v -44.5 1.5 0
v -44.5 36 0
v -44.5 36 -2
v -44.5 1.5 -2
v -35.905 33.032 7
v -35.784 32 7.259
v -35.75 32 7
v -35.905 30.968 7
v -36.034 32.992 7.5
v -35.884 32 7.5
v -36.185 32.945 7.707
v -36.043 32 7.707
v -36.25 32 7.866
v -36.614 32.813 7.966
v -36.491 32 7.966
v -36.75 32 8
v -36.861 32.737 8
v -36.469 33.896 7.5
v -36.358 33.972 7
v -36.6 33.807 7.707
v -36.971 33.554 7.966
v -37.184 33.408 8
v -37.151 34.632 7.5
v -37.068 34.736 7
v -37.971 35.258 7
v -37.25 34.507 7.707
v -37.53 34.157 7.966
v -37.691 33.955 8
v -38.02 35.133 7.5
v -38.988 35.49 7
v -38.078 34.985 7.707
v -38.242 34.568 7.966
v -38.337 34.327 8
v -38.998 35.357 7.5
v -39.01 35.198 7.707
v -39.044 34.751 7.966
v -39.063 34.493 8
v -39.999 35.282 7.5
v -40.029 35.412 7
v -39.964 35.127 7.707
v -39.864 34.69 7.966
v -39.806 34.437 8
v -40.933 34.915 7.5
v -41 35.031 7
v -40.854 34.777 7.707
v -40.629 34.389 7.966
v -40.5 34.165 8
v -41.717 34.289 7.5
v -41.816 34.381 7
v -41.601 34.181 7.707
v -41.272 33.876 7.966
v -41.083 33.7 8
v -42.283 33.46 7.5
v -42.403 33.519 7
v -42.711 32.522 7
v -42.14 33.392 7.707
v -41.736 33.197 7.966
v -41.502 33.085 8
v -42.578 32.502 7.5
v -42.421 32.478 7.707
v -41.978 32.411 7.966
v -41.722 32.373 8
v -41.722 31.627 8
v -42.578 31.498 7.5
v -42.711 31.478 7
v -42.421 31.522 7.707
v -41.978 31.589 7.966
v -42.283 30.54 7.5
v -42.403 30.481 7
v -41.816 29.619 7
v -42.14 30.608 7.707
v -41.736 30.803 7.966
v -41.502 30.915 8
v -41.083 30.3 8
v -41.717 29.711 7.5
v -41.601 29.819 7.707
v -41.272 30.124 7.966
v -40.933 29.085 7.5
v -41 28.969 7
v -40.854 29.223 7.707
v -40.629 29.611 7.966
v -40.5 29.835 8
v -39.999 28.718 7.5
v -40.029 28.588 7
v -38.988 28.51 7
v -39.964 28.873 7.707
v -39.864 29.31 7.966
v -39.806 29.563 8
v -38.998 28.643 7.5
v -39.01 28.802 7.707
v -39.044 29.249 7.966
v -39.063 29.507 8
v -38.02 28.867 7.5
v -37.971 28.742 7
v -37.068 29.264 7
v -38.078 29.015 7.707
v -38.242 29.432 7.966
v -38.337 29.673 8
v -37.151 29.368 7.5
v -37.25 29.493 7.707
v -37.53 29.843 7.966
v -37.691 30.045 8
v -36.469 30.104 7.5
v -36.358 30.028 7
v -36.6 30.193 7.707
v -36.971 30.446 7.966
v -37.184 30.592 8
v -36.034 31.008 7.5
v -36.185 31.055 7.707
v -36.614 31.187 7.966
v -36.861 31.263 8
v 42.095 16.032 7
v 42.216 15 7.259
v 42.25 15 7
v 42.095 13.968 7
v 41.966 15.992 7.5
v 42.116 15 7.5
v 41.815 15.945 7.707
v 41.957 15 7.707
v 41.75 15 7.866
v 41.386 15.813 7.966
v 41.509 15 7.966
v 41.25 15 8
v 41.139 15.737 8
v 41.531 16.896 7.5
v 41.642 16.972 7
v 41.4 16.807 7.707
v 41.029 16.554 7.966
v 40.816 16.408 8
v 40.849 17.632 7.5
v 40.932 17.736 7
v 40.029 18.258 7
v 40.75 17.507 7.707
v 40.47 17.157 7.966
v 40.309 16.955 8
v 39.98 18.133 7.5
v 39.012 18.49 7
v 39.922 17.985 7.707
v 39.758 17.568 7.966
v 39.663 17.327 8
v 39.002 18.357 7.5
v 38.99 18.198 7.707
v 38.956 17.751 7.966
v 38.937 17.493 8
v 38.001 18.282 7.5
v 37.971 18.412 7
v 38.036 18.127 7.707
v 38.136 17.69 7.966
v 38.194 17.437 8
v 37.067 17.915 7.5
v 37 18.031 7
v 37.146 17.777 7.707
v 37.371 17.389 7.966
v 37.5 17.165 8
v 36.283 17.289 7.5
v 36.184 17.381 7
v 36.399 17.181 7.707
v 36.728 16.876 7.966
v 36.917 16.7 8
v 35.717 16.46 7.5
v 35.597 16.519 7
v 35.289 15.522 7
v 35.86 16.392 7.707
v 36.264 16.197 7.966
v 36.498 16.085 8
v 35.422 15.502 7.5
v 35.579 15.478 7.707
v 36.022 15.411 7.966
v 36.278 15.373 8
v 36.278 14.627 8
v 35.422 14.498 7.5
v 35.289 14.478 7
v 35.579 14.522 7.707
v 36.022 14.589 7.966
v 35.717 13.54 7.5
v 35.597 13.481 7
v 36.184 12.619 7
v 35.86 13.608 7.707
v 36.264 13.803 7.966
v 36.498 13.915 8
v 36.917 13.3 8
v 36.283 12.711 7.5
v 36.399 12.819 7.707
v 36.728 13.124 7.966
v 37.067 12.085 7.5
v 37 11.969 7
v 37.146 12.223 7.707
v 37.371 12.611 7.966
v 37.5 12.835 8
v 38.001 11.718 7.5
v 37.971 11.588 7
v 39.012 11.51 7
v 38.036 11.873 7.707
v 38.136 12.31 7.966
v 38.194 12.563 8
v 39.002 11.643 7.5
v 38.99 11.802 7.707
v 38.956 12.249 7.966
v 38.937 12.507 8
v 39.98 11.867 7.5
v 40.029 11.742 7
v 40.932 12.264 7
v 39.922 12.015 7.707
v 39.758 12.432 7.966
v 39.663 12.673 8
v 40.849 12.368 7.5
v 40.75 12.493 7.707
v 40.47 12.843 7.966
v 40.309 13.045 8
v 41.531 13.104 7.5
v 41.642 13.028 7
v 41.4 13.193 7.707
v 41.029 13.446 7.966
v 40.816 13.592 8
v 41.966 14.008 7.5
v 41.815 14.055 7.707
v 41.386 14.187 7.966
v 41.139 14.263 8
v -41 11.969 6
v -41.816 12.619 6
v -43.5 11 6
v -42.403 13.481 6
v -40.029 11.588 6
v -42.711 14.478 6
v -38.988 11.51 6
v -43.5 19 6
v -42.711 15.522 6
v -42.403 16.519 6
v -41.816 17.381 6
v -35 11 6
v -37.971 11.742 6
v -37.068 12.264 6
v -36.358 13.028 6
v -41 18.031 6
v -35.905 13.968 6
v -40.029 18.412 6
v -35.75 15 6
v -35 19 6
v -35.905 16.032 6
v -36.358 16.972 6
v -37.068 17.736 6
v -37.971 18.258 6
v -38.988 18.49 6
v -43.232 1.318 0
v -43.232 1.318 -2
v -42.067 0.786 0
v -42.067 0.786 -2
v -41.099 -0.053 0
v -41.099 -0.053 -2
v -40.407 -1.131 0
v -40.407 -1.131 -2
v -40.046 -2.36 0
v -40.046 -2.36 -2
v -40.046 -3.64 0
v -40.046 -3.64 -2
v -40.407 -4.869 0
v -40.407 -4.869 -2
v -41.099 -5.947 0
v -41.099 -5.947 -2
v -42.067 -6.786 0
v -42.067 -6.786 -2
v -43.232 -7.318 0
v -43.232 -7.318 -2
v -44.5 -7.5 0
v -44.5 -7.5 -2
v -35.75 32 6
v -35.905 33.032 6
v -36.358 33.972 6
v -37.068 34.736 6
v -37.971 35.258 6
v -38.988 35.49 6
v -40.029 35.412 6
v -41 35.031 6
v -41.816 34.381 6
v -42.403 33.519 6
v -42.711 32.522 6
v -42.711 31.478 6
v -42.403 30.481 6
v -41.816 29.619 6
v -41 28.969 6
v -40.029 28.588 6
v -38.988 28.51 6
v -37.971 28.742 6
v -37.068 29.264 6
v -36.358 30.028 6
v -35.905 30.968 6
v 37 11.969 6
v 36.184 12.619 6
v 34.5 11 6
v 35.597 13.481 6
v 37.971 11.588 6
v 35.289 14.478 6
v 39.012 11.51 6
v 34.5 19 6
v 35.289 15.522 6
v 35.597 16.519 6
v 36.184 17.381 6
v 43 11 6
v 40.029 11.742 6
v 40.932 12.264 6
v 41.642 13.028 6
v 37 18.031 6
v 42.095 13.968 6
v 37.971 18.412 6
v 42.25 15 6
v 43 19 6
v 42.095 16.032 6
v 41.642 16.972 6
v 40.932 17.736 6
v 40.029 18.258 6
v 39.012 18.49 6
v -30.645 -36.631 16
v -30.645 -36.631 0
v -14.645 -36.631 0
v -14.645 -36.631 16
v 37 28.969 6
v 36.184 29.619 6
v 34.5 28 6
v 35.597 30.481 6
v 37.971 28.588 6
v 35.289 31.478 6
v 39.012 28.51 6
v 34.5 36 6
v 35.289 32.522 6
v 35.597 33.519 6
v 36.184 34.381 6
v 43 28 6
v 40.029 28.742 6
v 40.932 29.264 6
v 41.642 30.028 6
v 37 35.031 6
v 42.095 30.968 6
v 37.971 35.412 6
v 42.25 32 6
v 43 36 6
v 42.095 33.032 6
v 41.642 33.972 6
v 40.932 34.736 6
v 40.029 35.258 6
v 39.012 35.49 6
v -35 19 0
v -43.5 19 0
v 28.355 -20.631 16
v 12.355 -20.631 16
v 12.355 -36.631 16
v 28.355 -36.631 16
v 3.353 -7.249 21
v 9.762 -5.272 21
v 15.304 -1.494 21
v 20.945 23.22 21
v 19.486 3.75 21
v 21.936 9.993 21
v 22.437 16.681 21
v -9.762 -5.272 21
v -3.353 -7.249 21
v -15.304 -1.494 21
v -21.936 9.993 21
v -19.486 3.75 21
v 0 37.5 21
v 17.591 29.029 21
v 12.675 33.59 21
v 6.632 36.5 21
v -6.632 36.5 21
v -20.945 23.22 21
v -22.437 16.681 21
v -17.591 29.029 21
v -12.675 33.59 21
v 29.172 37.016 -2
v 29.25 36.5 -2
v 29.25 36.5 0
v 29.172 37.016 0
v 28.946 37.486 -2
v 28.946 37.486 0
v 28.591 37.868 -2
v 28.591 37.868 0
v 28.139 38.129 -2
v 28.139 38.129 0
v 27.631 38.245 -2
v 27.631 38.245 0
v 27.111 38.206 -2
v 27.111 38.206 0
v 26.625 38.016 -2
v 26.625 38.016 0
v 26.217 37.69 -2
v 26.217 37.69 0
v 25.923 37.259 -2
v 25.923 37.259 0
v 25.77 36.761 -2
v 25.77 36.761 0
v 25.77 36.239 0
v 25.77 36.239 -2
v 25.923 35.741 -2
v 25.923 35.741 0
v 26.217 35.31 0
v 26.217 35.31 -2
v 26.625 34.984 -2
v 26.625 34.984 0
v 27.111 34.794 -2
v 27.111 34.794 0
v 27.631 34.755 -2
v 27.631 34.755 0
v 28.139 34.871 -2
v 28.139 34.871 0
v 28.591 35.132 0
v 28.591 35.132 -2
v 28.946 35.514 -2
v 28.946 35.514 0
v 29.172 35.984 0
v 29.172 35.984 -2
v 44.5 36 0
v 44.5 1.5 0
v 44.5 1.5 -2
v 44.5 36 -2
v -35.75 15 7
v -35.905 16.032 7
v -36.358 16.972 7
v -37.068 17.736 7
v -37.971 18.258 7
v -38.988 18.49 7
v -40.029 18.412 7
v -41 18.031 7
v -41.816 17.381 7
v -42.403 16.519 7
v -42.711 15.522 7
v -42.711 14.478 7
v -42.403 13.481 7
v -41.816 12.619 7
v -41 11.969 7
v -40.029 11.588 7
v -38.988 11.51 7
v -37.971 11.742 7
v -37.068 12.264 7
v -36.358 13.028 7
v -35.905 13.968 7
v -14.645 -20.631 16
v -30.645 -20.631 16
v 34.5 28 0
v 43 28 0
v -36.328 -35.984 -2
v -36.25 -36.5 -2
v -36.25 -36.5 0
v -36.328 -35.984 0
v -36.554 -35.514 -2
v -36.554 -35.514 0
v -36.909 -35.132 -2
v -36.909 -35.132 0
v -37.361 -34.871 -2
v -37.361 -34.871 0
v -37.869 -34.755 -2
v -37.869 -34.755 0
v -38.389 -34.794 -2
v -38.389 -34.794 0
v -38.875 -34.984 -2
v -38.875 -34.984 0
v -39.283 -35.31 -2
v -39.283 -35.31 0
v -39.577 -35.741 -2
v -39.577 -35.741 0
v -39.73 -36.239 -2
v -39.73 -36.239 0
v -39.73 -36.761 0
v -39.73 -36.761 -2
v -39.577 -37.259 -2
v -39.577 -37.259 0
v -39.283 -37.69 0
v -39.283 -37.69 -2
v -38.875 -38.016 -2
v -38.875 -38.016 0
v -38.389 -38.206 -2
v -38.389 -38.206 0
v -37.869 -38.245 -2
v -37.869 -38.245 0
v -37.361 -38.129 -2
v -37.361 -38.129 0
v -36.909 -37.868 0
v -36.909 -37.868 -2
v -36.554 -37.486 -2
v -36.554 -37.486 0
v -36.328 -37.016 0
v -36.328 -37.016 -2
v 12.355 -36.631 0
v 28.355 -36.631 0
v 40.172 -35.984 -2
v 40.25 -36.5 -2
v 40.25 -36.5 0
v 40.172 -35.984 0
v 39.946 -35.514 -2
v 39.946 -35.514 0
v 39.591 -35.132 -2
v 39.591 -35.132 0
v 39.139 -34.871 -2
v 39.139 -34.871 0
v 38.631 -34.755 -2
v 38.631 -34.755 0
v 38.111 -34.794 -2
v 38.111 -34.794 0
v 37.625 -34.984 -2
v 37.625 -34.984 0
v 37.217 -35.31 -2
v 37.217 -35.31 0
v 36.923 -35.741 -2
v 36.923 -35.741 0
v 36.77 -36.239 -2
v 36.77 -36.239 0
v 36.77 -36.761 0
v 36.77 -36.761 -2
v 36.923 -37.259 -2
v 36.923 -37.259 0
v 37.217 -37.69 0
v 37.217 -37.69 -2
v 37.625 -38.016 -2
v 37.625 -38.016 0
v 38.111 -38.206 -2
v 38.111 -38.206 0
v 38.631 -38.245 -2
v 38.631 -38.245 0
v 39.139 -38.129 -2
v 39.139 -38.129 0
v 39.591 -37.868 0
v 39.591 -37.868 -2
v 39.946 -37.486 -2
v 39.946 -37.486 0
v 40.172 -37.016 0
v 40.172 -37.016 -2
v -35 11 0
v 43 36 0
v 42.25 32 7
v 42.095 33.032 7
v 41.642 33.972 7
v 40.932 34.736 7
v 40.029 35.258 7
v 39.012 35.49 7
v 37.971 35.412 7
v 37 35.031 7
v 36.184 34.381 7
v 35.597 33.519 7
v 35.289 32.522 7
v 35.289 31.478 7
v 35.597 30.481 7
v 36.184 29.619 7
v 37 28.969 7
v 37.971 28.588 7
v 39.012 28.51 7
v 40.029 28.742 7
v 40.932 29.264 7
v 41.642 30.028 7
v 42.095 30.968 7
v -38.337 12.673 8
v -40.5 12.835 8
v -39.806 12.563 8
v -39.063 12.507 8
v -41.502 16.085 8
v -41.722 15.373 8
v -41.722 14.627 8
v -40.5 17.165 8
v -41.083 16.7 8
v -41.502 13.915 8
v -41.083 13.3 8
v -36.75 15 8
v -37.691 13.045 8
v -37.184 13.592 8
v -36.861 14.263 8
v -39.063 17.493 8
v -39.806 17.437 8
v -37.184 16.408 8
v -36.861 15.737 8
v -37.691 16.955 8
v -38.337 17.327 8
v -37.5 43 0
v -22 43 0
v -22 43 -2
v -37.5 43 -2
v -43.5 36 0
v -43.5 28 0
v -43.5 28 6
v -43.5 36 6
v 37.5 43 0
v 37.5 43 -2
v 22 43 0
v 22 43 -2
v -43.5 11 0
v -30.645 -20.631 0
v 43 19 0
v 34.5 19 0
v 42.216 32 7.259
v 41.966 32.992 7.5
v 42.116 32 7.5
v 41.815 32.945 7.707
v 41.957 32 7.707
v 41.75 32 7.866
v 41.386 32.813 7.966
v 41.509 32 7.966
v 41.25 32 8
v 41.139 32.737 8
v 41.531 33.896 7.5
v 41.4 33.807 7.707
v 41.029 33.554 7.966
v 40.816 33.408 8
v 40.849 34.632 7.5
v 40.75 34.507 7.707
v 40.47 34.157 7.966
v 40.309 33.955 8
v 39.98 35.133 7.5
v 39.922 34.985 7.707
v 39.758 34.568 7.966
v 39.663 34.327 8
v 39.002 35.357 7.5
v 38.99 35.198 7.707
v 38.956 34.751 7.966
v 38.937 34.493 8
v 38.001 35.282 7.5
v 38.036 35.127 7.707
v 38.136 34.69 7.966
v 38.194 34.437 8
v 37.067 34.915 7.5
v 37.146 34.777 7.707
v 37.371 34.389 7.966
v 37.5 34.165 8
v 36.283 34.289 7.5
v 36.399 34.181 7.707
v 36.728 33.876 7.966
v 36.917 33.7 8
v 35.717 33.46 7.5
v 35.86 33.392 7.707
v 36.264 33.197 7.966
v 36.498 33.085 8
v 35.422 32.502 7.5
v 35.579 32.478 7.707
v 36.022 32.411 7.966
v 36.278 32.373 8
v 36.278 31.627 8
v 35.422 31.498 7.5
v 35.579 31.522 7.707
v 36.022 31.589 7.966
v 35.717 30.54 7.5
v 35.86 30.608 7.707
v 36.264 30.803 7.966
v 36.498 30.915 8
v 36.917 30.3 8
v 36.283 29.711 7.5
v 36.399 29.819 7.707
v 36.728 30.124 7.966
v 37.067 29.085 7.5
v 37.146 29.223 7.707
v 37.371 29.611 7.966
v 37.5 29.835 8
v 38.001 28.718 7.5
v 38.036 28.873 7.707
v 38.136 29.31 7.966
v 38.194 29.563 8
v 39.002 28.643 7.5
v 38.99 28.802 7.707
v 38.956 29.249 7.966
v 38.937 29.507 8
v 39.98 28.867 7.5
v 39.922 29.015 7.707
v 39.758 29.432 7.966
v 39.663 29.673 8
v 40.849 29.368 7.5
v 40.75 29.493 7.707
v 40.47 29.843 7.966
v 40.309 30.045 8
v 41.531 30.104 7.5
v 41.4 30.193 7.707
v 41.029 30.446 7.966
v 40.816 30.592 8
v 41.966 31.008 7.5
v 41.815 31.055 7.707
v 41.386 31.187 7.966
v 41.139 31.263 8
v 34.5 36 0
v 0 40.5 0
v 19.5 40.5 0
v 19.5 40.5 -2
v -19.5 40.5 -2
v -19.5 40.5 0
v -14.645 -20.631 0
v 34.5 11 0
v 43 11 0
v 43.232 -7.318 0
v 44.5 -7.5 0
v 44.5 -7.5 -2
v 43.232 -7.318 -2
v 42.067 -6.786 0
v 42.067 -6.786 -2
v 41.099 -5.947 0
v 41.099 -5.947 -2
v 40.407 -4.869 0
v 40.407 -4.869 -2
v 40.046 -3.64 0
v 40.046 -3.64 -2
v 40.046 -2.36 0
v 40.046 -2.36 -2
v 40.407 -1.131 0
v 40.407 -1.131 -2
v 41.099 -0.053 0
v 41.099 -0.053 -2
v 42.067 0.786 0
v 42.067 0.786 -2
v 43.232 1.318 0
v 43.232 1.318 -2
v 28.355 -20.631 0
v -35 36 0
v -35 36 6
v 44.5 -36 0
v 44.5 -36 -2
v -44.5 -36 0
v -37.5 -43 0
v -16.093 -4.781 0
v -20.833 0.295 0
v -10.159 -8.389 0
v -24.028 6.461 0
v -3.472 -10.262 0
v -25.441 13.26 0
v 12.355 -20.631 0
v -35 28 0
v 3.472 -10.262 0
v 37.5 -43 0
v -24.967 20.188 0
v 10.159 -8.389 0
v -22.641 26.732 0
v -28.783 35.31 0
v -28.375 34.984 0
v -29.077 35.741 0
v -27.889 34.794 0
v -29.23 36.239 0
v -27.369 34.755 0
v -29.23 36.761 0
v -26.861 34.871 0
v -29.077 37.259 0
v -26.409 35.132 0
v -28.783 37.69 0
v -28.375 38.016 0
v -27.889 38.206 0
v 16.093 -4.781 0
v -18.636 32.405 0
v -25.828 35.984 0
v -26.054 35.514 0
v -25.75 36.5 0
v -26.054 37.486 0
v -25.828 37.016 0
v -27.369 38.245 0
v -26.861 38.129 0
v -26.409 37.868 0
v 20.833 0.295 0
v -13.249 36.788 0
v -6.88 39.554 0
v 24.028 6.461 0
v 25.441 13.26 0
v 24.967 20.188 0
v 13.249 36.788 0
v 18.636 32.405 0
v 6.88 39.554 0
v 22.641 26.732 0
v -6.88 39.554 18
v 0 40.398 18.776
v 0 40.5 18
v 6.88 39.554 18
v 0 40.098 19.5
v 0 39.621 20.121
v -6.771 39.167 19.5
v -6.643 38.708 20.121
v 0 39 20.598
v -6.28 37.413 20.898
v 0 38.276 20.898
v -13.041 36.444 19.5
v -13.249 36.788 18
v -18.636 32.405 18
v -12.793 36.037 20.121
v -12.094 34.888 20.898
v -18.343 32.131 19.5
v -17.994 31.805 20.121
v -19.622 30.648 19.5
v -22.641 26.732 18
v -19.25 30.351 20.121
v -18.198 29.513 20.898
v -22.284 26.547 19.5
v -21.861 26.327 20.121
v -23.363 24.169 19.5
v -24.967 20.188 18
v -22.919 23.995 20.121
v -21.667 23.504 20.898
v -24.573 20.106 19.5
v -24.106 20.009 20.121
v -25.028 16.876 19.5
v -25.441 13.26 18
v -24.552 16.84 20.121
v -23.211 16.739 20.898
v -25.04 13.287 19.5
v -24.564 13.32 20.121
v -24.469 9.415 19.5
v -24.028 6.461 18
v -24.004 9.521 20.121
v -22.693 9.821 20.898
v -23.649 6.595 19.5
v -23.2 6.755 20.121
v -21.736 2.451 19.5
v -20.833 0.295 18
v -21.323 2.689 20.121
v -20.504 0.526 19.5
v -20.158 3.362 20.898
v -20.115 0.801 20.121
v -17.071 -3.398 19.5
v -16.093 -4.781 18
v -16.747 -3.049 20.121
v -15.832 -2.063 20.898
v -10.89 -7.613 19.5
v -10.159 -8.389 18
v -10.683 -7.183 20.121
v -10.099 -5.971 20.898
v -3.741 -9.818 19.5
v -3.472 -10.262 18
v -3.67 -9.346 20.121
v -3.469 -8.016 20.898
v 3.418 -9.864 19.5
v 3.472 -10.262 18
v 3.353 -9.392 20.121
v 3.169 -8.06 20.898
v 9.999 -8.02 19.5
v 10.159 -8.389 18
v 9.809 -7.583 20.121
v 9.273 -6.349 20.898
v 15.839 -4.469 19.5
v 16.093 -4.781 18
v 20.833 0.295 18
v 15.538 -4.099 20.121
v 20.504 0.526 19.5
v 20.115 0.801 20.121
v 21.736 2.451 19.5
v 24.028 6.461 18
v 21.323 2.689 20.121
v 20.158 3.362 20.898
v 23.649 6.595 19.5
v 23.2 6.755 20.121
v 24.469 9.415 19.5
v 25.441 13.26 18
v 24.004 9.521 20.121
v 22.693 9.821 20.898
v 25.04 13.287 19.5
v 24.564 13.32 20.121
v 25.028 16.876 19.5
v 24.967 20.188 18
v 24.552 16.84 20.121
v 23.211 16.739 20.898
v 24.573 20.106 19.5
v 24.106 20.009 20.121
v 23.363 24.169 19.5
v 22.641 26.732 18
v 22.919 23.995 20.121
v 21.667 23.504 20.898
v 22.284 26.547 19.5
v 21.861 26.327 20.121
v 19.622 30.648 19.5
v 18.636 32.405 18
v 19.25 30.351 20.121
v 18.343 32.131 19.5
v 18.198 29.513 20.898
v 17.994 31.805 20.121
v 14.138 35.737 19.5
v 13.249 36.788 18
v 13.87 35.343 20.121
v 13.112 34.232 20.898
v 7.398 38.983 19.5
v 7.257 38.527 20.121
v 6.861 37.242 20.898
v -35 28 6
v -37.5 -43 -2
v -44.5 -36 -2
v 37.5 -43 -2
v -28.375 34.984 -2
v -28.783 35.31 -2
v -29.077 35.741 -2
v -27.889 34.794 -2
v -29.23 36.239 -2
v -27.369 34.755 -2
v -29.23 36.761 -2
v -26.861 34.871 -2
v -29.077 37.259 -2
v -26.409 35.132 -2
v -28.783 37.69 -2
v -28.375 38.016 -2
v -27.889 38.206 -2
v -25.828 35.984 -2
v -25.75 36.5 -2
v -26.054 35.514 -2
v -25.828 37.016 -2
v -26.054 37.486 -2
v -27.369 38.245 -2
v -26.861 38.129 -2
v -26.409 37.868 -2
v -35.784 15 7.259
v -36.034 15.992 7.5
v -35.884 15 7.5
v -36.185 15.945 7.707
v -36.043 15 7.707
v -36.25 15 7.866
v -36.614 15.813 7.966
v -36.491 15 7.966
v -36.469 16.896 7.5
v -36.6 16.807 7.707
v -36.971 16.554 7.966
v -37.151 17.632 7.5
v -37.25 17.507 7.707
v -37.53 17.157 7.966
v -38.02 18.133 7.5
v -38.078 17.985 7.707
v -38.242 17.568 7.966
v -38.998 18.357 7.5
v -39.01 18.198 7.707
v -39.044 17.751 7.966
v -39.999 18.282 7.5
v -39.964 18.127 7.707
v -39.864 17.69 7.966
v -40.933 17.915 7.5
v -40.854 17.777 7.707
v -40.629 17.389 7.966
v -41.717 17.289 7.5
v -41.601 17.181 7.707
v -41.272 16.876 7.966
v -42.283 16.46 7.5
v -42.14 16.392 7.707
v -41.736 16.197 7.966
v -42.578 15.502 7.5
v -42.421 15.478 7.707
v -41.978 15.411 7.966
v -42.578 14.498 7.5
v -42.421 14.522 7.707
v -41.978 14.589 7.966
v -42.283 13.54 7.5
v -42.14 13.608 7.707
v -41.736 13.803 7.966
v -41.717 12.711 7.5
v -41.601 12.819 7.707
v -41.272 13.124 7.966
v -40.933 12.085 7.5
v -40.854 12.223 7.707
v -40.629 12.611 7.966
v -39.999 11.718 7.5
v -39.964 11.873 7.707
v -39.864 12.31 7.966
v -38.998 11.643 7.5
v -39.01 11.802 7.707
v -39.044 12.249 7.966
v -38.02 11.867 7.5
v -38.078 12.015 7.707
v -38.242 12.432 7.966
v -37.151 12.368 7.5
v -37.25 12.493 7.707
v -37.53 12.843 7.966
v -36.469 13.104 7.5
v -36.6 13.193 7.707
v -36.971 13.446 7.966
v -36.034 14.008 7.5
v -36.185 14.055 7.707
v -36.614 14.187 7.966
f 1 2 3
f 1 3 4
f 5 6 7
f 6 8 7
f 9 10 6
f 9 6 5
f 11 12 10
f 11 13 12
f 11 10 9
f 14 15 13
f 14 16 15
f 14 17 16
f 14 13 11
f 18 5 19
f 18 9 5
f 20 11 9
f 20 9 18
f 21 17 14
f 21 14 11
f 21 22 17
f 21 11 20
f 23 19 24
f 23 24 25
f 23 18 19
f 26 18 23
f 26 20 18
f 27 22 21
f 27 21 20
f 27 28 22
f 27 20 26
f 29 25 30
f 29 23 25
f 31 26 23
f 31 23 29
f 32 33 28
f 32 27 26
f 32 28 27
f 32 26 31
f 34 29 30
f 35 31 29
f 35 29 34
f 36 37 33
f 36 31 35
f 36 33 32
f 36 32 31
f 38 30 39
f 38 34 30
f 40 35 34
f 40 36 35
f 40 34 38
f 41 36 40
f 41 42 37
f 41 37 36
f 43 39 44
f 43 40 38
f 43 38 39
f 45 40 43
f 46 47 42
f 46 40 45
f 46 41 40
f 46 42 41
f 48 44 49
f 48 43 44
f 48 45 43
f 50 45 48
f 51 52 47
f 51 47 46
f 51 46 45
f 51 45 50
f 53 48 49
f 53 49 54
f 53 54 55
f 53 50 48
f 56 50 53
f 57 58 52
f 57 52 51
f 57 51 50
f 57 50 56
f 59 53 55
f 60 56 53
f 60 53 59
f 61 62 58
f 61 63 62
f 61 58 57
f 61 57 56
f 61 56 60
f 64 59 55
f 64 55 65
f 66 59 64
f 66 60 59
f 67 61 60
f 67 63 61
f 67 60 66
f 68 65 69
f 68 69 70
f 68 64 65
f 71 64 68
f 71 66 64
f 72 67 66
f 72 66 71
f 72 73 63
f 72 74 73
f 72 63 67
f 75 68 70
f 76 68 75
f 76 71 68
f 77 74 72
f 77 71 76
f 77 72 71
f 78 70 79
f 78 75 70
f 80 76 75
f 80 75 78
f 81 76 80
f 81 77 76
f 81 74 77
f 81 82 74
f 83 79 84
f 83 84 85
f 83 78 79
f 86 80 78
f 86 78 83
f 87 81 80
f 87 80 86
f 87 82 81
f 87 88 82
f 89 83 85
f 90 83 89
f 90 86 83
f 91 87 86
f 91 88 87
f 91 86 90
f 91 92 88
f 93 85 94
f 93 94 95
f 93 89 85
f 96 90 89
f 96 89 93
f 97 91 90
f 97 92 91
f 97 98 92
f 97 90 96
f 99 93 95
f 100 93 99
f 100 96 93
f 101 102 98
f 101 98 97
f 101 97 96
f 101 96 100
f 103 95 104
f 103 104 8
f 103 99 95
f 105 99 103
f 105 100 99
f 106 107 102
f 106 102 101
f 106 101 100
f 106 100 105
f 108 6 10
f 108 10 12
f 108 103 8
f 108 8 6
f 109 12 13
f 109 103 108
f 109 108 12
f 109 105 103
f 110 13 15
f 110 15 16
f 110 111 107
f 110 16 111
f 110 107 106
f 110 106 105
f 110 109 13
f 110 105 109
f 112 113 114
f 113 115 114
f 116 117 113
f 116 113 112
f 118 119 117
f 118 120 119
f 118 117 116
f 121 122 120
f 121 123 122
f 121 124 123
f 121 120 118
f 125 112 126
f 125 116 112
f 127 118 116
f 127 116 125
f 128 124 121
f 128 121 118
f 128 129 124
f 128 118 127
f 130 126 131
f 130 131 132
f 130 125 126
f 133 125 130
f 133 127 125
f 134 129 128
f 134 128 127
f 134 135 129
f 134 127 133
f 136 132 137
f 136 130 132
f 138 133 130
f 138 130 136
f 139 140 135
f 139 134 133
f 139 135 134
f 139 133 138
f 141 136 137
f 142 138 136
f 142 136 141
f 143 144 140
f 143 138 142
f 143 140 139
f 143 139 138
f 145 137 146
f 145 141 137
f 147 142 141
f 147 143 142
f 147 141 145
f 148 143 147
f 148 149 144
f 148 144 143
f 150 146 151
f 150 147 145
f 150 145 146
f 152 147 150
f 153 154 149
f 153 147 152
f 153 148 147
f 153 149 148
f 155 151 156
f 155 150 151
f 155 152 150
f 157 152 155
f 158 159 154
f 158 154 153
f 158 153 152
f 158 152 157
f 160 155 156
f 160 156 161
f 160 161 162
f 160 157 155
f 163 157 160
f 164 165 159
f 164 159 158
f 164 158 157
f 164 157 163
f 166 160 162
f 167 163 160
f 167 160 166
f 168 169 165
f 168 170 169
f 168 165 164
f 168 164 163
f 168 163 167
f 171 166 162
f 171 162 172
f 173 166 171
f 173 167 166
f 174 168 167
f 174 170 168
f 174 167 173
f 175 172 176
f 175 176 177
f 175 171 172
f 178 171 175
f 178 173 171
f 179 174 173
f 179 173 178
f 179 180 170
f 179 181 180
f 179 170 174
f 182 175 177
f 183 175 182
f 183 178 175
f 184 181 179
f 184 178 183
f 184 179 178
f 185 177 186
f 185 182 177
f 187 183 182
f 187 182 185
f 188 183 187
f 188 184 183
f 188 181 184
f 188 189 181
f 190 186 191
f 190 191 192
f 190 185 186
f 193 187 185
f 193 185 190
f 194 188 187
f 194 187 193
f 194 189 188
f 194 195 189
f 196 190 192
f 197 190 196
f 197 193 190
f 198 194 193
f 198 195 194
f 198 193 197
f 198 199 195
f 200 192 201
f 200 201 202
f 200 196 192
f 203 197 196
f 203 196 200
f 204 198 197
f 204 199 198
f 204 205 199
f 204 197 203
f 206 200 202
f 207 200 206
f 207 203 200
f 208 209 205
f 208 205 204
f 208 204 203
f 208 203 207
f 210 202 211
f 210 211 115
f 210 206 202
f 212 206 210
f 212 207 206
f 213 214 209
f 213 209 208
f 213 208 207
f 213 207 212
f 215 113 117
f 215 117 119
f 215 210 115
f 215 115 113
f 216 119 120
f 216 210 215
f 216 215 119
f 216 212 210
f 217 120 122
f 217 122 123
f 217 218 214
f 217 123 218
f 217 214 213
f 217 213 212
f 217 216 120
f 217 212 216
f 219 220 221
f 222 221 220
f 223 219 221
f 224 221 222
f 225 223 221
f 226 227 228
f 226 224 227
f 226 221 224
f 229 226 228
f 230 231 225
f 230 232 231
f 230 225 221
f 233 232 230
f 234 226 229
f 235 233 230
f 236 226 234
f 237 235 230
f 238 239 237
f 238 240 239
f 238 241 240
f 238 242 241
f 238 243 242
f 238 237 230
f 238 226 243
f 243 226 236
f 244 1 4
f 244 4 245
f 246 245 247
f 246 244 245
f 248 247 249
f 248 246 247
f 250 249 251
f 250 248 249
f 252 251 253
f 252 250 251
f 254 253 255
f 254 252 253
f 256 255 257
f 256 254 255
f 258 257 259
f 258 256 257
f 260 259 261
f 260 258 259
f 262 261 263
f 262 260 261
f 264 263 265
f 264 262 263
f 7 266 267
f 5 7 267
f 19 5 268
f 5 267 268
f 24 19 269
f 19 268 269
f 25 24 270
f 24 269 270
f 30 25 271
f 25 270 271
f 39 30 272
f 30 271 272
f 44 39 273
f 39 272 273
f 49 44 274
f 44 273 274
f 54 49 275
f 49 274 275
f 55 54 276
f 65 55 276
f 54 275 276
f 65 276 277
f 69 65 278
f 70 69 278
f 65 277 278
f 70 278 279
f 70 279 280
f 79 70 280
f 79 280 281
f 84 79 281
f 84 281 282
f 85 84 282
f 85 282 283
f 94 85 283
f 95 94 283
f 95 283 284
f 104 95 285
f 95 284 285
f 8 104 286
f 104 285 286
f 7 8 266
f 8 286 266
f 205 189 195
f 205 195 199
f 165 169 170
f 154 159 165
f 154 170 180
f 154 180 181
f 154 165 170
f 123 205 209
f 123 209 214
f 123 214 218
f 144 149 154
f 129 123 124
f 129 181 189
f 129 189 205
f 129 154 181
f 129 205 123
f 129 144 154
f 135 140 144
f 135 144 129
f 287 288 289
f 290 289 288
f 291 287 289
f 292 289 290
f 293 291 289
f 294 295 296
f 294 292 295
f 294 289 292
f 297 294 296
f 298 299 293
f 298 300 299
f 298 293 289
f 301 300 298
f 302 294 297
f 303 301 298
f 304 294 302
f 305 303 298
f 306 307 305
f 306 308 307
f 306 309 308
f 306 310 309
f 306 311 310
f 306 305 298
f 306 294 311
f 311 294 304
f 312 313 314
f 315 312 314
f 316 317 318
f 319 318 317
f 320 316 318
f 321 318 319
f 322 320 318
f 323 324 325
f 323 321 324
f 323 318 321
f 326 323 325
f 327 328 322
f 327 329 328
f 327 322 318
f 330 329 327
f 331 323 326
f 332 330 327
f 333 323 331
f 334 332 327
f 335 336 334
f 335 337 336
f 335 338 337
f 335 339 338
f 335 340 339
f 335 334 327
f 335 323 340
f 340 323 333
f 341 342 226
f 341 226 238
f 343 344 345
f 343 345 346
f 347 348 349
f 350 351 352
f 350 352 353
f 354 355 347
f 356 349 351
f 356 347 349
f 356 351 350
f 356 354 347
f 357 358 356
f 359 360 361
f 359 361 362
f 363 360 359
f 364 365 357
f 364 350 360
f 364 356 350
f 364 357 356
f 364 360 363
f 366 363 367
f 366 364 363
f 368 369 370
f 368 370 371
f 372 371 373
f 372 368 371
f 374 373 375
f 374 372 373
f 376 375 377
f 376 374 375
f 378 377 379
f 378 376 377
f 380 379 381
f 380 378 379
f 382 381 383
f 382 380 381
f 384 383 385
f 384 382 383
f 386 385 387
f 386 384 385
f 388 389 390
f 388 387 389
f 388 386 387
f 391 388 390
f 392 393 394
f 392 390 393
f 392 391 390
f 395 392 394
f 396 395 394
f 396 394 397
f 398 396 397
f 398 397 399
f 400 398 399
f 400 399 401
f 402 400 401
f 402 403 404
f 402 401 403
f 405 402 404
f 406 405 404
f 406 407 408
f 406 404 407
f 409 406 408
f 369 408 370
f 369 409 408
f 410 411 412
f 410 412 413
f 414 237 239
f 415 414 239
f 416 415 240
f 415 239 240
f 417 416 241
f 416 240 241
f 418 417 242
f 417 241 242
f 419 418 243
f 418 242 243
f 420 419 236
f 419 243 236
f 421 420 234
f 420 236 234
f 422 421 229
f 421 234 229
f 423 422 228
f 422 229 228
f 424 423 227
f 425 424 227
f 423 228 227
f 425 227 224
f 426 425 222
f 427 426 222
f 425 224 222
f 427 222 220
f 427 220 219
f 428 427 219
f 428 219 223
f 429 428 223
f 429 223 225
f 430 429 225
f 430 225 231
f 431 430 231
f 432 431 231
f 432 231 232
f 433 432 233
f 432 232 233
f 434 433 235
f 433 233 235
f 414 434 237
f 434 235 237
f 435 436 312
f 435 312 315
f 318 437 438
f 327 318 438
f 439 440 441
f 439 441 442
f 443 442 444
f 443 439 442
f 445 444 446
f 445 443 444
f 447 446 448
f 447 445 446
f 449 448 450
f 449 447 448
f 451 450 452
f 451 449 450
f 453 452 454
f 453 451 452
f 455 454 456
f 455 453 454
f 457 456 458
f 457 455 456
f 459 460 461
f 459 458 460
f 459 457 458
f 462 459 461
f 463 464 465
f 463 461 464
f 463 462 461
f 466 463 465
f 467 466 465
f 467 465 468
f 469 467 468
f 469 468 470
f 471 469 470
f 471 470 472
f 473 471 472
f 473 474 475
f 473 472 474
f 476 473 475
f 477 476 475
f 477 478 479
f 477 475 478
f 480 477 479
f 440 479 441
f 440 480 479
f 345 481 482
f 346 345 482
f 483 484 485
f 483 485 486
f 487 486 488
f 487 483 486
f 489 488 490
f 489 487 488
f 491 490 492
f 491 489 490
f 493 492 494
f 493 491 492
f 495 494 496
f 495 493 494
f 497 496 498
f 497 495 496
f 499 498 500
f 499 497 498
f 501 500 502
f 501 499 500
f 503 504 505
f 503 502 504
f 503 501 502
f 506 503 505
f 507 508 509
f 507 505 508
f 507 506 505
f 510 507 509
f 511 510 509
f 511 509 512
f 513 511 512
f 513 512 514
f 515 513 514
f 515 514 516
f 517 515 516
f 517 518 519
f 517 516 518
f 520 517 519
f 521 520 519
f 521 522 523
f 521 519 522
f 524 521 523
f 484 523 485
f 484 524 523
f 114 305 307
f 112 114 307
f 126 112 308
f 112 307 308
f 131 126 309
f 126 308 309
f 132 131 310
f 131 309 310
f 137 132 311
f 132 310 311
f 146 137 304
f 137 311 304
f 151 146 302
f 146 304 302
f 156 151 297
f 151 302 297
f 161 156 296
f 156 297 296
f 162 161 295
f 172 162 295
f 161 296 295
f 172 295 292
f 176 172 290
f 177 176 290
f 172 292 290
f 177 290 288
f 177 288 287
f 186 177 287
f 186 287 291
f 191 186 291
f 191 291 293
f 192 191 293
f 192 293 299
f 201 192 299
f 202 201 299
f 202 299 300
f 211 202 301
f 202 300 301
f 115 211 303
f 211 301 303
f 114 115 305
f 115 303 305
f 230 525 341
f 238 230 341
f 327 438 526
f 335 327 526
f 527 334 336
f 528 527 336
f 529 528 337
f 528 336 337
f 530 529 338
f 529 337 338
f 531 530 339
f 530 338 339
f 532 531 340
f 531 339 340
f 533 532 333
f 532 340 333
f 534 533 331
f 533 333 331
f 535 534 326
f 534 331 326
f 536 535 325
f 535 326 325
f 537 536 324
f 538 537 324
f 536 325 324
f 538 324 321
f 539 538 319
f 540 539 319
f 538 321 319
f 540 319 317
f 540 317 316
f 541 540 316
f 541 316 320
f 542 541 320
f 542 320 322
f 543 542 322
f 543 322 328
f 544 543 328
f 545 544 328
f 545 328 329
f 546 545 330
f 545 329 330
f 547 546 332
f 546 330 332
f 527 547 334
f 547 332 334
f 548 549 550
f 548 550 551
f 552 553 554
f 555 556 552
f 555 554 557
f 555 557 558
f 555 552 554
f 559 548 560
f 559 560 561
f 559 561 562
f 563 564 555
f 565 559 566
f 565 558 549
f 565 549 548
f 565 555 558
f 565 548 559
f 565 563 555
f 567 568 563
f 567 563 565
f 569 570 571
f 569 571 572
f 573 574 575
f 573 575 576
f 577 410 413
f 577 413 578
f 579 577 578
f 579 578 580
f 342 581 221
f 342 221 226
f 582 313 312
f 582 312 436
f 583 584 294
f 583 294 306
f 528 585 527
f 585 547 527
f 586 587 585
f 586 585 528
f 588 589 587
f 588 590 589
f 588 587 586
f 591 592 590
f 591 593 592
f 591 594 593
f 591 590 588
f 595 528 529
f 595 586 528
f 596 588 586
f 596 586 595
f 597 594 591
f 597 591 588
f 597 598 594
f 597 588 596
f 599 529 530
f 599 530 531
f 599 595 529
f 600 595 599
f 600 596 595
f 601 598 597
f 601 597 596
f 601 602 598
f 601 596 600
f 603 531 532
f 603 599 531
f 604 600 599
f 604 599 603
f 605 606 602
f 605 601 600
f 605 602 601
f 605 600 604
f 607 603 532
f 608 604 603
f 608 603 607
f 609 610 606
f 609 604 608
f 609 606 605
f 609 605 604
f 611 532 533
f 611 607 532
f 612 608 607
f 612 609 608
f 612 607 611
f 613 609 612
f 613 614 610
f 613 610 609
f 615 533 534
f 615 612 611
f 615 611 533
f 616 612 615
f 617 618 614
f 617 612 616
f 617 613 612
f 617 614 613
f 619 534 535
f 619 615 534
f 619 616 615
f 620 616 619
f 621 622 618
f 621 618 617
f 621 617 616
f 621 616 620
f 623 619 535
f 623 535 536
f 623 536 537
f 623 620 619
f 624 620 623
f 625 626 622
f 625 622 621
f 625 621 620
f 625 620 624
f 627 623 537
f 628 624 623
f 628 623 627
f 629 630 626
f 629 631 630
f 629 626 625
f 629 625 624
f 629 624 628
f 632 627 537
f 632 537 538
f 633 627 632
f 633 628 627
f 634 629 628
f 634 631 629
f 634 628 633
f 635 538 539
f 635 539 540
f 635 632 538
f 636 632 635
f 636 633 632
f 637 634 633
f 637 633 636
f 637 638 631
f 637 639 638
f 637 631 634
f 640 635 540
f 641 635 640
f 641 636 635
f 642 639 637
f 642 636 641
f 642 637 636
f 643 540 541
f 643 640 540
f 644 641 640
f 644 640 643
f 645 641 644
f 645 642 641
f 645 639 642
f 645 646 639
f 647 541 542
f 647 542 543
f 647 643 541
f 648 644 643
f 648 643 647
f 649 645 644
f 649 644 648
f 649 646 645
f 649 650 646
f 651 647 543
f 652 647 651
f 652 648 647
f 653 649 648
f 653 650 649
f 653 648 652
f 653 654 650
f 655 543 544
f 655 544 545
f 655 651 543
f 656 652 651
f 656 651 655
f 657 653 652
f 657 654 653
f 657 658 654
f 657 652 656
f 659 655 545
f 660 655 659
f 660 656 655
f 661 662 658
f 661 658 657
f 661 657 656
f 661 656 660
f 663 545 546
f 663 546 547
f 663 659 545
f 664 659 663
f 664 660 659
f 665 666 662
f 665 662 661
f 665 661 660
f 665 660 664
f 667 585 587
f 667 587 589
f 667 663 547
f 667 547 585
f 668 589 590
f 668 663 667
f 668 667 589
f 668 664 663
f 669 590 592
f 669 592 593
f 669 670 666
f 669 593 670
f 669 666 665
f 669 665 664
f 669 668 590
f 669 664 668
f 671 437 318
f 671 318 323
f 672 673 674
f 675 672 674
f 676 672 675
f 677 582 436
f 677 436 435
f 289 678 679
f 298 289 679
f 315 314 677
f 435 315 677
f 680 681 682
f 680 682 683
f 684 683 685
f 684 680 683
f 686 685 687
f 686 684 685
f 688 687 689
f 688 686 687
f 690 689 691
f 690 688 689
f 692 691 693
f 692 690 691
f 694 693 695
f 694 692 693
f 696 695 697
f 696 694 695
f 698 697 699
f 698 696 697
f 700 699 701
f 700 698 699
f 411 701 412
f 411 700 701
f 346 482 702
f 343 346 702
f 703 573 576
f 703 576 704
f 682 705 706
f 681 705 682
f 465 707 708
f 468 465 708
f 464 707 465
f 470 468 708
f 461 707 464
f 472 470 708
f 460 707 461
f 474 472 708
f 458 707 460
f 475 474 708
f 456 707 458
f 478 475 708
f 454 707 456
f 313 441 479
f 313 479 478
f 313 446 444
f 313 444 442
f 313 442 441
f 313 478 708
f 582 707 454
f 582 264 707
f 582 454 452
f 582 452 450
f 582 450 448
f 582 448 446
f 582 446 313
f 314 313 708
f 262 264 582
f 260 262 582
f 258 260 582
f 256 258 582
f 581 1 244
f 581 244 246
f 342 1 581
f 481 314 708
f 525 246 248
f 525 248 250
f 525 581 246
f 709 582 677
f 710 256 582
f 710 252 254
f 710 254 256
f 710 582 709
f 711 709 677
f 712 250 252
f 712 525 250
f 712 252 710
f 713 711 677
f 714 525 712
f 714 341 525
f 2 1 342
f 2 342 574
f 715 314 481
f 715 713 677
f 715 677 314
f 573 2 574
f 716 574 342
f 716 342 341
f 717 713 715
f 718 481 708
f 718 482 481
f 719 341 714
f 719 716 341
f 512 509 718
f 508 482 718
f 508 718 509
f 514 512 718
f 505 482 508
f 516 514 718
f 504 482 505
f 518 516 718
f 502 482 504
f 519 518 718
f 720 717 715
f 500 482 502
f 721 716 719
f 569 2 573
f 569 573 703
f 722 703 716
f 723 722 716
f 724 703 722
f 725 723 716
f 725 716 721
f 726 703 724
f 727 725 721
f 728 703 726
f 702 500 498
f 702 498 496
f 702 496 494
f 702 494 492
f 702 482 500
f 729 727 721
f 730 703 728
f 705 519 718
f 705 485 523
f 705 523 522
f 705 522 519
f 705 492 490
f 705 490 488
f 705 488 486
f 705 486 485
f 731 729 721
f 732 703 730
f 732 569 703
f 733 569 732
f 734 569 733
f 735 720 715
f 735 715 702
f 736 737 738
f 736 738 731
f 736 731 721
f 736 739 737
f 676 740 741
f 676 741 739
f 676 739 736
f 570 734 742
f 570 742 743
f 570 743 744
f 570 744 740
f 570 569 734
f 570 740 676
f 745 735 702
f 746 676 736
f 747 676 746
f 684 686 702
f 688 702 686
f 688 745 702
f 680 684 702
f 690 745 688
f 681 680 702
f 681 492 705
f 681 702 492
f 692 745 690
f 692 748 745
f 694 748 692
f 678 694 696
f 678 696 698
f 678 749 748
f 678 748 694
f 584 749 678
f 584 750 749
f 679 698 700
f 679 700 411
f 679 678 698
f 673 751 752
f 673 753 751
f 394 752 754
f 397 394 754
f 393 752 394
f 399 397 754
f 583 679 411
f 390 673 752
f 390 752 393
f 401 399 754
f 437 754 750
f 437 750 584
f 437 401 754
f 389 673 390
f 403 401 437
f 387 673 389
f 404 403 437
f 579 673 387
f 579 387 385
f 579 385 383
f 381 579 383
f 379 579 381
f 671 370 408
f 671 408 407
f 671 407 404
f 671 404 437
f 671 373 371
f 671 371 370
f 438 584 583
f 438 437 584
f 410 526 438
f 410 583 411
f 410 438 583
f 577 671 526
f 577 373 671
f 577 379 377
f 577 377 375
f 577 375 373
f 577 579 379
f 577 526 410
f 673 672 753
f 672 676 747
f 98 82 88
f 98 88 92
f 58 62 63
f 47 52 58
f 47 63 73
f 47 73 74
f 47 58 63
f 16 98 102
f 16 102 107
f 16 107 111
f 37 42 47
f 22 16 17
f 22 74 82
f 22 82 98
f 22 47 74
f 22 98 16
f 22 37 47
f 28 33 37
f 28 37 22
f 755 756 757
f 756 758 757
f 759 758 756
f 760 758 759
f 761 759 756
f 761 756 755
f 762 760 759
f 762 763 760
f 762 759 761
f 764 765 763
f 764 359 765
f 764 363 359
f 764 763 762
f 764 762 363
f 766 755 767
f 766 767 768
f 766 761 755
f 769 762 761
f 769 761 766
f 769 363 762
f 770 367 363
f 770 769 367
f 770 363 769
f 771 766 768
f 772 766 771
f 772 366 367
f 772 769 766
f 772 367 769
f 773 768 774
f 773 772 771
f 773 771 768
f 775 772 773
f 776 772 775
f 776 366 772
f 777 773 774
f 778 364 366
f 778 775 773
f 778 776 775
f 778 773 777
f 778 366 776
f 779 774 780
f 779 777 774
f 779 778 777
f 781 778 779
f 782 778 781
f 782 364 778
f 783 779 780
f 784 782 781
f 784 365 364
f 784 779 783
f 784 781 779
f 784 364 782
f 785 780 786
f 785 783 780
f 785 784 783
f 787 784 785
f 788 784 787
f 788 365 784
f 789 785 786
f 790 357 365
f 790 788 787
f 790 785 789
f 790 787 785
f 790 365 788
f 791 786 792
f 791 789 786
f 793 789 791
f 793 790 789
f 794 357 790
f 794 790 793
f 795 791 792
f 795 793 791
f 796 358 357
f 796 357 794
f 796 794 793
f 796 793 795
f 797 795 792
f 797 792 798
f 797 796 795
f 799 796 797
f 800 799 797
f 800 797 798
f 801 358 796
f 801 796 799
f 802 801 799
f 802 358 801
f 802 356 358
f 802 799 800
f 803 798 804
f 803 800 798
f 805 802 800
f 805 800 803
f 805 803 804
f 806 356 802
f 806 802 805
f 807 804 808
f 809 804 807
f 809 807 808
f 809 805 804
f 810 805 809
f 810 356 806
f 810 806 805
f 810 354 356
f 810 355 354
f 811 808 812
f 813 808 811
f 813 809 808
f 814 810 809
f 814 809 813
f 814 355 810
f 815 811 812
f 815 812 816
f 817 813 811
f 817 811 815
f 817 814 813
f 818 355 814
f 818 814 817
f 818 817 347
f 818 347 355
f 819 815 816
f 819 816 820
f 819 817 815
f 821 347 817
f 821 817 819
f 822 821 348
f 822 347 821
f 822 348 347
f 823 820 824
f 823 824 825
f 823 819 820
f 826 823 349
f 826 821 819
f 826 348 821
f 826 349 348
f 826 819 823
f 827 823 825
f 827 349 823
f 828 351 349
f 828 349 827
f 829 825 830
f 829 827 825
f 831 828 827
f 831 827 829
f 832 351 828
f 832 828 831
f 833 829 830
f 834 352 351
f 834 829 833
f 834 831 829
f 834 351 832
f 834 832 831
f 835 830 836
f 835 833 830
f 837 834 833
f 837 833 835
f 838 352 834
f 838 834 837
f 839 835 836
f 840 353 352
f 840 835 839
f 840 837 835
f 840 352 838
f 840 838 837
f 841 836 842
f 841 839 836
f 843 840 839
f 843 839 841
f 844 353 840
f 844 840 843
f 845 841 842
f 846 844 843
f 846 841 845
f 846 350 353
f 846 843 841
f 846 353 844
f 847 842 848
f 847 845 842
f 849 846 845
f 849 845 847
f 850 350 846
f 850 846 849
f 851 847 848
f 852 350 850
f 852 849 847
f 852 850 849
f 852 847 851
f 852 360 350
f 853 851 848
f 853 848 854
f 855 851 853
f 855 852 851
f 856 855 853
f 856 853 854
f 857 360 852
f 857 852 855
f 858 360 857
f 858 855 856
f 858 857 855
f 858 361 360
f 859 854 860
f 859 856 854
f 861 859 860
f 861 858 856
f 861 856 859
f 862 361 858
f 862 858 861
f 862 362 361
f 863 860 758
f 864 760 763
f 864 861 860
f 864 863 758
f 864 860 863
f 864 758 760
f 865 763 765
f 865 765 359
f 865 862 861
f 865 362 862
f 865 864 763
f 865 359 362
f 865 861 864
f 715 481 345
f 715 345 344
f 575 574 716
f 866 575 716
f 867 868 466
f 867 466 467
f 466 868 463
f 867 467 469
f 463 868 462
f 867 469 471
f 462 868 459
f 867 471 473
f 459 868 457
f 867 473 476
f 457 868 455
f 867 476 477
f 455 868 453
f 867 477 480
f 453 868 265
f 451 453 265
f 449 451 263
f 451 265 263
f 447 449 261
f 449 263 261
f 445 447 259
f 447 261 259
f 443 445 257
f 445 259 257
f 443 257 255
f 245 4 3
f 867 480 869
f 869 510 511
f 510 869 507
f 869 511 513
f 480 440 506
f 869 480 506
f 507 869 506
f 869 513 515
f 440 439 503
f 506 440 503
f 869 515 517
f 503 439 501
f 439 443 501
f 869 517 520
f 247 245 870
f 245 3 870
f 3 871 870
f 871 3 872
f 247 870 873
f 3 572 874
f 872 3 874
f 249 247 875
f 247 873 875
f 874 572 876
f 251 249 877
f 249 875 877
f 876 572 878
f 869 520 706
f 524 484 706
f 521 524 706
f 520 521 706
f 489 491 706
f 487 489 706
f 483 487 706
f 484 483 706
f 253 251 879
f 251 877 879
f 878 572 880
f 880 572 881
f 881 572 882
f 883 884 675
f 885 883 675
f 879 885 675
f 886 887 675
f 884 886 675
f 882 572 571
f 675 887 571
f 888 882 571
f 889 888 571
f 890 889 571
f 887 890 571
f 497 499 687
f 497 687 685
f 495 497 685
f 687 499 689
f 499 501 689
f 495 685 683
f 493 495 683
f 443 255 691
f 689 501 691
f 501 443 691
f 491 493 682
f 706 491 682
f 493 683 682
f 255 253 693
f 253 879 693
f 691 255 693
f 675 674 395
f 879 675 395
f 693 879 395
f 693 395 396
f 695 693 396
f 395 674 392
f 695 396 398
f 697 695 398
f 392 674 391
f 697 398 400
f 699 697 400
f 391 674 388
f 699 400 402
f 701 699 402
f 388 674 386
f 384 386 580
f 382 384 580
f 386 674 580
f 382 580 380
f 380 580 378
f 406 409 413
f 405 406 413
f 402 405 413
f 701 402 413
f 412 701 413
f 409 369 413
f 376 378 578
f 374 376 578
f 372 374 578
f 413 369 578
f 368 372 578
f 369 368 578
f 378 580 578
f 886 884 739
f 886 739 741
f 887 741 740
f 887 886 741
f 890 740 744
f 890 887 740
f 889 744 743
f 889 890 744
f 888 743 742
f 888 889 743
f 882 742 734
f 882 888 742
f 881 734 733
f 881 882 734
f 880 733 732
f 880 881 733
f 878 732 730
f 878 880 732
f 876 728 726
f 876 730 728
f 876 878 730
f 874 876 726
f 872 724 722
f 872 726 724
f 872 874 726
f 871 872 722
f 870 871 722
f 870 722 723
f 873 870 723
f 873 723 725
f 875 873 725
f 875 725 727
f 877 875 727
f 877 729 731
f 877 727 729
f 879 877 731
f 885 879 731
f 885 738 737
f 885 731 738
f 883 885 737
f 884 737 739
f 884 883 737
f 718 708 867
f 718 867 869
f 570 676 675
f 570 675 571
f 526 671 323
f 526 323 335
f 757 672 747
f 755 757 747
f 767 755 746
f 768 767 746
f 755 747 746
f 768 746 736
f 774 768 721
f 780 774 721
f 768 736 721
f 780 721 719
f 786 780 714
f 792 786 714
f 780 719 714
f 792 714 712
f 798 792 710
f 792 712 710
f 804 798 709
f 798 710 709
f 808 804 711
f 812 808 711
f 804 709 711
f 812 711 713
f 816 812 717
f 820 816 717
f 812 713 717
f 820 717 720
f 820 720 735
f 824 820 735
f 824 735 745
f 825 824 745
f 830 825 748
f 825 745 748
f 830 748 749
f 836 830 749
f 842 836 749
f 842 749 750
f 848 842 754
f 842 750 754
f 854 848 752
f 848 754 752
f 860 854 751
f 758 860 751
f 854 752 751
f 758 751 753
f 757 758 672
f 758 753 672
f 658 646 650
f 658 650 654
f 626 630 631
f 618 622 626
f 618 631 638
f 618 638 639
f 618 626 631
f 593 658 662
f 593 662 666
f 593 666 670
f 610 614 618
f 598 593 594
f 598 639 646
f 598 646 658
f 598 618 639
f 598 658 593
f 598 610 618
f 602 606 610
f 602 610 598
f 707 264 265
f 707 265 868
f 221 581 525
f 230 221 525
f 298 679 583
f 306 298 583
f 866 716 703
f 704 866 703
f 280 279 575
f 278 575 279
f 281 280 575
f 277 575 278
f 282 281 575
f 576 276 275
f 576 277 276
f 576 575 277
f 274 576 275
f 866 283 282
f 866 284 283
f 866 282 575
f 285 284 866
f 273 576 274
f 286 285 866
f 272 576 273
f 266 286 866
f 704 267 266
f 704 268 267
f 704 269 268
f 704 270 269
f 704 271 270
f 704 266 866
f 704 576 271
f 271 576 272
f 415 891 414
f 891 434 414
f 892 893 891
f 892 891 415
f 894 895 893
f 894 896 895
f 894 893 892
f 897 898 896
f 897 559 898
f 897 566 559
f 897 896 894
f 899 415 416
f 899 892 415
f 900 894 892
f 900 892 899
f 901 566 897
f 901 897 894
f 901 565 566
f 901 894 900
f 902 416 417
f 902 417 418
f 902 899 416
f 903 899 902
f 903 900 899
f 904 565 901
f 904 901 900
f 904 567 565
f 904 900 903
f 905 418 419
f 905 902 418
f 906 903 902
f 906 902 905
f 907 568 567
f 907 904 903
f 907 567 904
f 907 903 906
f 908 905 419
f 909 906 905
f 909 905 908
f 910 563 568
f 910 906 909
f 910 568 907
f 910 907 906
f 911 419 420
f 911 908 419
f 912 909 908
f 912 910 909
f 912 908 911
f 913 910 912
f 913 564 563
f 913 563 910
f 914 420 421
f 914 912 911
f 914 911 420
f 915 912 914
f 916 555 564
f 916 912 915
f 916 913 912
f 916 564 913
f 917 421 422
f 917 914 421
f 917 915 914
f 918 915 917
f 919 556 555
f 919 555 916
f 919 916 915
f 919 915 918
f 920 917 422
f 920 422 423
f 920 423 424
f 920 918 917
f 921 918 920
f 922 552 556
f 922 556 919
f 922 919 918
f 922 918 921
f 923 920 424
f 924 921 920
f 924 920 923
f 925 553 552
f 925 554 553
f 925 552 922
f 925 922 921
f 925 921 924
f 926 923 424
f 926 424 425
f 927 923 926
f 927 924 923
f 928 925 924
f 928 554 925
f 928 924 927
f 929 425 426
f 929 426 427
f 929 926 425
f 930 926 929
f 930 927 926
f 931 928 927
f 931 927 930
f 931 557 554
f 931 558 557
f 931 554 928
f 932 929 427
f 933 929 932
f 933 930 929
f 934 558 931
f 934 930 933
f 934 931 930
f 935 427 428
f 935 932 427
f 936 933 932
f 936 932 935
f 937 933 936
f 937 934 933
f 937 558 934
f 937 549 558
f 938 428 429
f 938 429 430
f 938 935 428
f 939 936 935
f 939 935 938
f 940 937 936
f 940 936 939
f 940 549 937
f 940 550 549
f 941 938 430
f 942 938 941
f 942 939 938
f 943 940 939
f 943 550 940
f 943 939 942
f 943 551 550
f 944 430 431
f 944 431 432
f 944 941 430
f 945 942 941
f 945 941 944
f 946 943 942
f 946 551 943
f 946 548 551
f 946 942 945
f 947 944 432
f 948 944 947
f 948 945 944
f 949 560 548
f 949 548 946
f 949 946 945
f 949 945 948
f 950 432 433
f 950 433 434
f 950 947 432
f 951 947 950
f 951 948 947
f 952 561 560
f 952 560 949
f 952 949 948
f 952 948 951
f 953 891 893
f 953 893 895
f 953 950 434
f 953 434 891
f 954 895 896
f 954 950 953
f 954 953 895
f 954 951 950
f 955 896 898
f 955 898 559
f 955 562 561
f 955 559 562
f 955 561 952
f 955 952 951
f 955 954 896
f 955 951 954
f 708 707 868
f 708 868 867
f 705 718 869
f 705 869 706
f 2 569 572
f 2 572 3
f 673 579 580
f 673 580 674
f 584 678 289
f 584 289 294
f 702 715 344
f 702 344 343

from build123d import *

# Parameters (mm, degrees)
BOSS_EXTRUDE1_DEPTH     = 2
SKETCH2_W               = 8.5
SKETCH2_H               = 8
BOSS_EXTRUDE2_DEPTH     = 6
SKETCH3_R               = 3.5
BOSS_EXTRUDE3_DEPTH     = 2
FILLET1_R               = 1
SKETCH4_R               = 25.5
BOSS_EXTRUDE4_DEPTH     = 21
FILLET2_R               = 3
SKETCH6_W               = 16
SKETCH6_H               = 16
BOSS_EXTRUDE5_DEPTH     = 16
CUT_EXTRUDE1_DEPTH      = 66.3471499
CUT_EXTRUDE1_DEPTH_BACK = 66.3471499
SKETCH7_R               = 1.75


with BuildPart() as part:
    # Sketch1 → Boss-Extrude1 (new body)
    with BuildSketch(Plane.XY):
        with BuildLine():
            Line((44.5, 36), (37.5, 43))
            Line((37.5, 43), (22, 43))
            Line((22, 43), (19.5, 40.5))
            Line((19.5, 40.5), (-19.5, 40.5))
            Line((-19.5, 40.5), (-22, 43))
            Line((-22, 43), (-37.5, 43))
            Line((-37.5, 43), (-44.5, 36))
            Line((-44.5, 36), (-44.5, 1.5))
            ThreePointArc((-44.5, 1.5), (-40, -3), (-44.5, -7.5))
            Line((-44.5, -7.5), (-44.5, -36))
            Line((-44.5, -36), (-37.5, -43))
            Line((-37.5, -43), (37.5, -43))
            Line((37.5, -43), (44.5, -36))
            Line((44.5, -36), (44.5, -7.5))
            ThreePointArc((44.5, -7.5), (40, -3), (44.5, 1.5))
            Line((44.5, 1.5), (44.5, 36))
        make_face()
    extrude(amount=-BOSS_EXTRUDE1_DEPTH)

    # Sketch2 → Boss-Extrude2 (add)
    with BuildSketch(Plane.XY):
        with Locations((-39.25, 32)):
            Rectangle(SKETCH2_W, SKETCH2_H)
        with Locations((38.75, 32)):
            Rectangle(SKETCH2_W, SKETCH2_H)
        with Locations((38.75, 15)):
            Rectangle(SKETCH2_W, SKETCH2_H)
        with Locations((-39.25, 15)):
            Rectangle(SKETCH2_W, SKETCH2_H)
    extrude(amount=BOSS_EXTRUDE2_DEPTH)

    # Sketch3 → Boss-Extrude3 (add)
    with BuildSketch(Plane.XY.offset(6)):
        with Locations((-39.25, 32)):
            Circle(SKETCH3_R)
        with Locations((38.75, 32)):
            Circle(SKETCH3_R)
        with Locations((38.75, 15)):
            Circle(SKETCH3_R)
        with Locations((-39.25, 15)):
            Circle(SKETCH3_R)
    extrude(amount=BOSS_EXTRUDE3_DEPTH)

    # Fillet1
    fillet1_edges = [part.edges().sort_by_distance(p)[0] for p in [
        (35.25, 32, 8),
        (35.25, 15, 8),
        (-42.75, 15, 8),
        (-42.75, 32, 8),
    ]]
    fillet(fillet1_edges, radius=FILLET1_R)

    # Sketch4 → Boss-Extrude4 (add)
    with BuildSketch(Plane.XY):
        with Locations(Location((0, 15, 0), (0, 0, 90))):
            Circle(SKETCH4_R)
    extrude(amount=BOSS_EXTRUDE4_DEPTH)

    # Fillet2
    fillet2_edges = [part.edges().sort_by_distance(p)[0] for p in [
        (0, -10.5, 21),
    ]]
    fillet(fillet2_edges, radius=FILLET2_R)

    # Sketch6 → Boss-Extrude5 (add)
    with BuildSketch(Plane.XY):
        with Locations((20.355257786, -28.630901536)):
            Rectangle(SKETCH6_W, SKETCH6_H)
        with Locations((-22.644742214, -28.630901536)):
            Rectangle(SKETCH6_W, SKETCH6_H)
    extrude(amount=BOSS_EXTRUDE5_DEPTH)

    # Sketch7 → Cut-Extrude1 (cut, two sides: drawn at the far end of the back side and taken through both)
    with BuildSketch(Plane.XY.offset(-CUT_EXTRUDE1_DEPTH_BACK)):
        with Locations((-27.5, 36.5)):
            Circle(SKETCH7_R)
        with Locations((27.5, 36.5)):
            Circle(SKETCH7_R)
        with Locations((-38, -36.5)):
            Circle(SKETCH7_R)
        with Locations((38.5, -36.5)):
            Circle(SKETCH7_R)
    extrude(amount=CUT_EXTRUDE1_DEPTH + CUT_EXTRUDE1_DEPTH_BACK, mode=Mode.SUBTRACT)


solid = part.part
